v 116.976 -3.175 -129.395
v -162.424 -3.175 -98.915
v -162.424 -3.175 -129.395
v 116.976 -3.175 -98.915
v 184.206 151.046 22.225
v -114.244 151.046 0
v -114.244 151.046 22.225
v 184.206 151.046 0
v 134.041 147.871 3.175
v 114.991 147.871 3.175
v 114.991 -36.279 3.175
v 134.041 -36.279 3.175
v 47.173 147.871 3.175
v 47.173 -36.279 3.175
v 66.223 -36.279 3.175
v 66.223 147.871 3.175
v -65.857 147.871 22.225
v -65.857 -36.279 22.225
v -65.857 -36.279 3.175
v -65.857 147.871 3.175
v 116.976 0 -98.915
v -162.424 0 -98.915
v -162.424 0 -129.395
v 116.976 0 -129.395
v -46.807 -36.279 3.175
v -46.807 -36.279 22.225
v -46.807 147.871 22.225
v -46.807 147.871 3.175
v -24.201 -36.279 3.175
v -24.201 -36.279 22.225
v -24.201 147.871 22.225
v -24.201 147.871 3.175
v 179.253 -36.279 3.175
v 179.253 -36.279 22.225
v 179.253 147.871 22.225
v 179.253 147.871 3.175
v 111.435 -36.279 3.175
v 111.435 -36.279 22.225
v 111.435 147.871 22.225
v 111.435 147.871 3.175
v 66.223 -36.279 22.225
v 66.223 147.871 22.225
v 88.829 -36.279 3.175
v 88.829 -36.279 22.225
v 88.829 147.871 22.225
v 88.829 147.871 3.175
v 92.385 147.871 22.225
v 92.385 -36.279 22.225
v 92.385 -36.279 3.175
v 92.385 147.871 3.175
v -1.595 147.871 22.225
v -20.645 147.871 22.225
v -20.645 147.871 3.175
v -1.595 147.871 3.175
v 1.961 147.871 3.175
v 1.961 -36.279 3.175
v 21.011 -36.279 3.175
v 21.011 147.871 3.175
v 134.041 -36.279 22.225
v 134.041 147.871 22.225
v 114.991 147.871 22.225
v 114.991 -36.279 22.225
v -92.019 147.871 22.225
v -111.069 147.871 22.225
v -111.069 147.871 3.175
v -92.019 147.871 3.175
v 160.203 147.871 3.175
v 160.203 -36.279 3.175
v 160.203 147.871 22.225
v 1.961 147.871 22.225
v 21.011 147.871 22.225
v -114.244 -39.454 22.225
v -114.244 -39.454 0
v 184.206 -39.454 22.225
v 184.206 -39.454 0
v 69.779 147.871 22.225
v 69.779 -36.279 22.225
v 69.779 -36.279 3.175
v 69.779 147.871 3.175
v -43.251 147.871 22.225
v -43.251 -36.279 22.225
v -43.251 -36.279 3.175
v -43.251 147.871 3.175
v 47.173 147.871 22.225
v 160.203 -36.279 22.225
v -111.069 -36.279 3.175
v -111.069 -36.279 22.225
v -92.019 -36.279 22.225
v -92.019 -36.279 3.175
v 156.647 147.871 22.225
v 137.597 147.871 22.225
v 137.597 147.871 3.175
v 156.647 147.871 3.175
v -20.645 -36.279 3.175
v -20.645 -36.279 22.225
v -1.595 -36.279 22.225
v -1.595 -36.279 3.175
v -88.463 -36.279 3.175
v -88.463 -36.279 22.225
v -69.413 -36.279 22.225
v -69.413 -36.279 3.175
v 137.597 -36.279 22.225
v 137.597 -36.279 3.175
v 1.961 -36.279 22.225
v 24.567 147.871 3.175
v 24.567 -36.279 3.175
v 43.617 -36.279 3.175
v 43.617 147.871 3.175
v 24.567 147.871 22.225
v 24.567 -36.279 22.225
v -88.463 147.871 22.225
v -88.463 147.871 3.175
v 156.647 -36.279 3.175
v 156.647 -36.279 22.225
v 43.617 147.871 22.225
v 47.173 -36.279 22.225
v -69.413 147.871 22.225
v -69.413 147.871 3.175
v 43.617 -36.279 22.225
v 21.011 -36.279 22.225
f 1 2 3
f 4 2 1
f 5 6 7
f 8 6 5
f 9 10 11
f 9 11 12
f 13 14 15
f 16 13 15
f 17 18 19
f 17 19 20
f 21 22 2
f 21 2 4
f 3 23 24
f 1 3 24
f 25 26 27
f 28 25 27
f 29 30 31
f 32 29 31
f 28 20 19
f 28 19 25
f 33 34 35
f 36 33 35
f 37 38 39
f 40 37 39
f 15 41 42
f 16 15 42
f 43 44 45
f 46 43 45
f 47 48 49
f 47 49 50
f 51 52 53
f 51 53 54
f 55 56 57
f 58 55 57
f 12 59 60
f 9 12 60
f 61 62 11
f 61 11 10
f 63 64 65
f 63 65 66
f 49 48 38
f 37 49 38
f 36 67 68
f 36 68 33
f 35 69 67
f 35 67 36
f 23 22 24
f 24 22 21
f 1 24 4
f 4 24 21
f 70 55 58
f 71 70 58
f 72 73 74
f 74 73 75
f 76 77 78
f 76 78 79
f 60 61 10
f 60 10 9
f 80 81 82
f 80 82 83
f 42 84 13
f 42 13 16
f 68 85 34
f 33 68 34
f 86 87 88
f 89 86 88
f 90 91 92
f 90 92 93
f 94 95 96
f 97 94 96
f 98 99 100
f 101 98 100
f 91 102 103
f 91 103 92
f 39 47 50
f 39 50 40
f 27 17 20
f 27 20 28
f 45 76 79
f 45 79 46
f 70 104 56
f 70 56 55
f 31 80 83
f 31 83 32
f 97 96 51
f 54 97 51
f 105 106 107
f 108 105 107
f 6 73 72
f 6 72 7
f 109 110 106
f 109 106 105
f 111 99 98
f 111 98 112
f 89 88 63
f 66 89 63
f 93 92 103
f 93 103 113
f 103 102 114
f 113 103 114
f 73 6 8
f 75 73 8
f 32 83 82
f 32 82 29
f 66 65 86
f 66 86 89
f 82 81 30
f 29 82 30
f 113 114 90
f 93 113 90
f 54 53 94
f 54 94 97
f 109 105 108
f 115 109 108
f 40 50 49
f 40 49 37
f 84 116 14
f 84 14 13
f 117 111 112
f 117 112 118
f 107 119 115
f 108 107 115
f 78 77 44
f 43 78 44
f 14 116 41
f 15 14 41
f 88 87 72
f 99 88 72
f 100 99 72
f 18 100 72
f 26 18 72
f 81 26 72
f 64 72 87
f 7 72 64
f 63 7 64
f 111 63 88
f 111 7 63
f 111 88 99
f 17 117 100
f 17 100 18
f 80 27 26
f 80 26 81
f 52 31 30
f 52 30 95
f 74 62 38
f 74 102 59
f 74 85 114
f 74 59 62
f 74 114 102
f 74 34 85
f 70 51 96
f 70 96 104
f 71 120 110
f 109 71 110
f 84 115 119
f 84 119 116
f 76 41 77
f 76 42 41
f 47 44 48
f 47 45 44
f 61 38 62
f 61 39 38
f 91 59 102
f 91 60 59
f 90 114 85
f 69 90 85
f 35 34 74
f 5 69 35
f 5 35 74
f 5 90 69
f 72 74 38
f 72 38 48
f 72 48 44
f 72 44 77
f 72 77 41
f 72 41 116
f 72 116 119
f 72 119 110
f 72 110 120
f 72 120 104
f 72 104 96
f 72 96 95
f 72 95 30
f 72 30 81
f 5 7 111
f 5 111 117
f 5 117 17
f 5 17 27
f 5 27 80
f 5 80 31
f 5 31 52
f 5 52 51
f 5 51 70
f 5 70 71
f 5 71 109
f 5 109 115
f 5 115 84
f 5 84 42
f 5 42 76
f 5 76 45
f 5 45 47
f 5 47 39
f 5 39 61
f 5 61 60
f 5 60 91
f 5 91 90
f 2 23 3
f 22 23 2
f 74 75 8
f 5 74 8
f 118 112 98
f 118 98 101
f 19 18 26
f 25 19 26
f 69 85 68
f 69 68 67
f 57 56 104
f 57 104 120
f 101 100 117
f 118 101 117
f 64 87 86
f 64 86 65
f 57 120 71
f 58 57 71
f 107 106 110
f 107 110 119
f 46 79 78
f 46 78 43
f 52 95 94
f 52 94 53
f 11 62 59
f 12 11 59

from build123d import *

# Parameters (mm, degrees)
F0_W     = 298.45
F0_H     = 190.5
F1_DEPTH = 22.225
F2_W     = 279.4
F2_H     = 30.48
F3_DEPTH = 3.175
F4_W     = 19.05
F4_H     = 184.15
F5_DEPTH = 19.05


with BuildPart() as f1:
    # F0 (on Top) → F1 (new body)
    with BuildSketch(Plane.XY):
        with Locations((34.980681, 55.79597)):
            Rectangle(F0_W, F0_H)
    extrude(amount=F1_DEPTH)

    # F4 (on face) → F5 (cut)
    with BuildSketch(Plane.XY.offset(22.225)):
        with Locations((-101.544319, 55.79597)):
            Rectangle(F4_W, F4_H)
        with Locations((-78.938319, 55.79597)):
            Rectangle(F4_W, F4_H)
        with Locations((-56.332319, 55.79597)):
            Rectangle(F4_W, F4_H)
        with Locations((-33.726319, 55.79597)):
            Rectangle(F4_W, F4_H)
        with Locations((-11.120319, 55.79597)):
            Rectangle(F4_W, F4_H)
        with Locations((11.485681, 55.79597)):
            Rectangle(F4_W, F4_H)
        with Locations((34.091681, 55.79597)):
            Rectangle(F4_W, F4_H)
        with Locations((56.697681, 55.79597)):
            Rectangle(F4_W, F4_H)
        with Locations((79.303681, 55.79597)):
            Rectangle(F4_W, F4_H)
        with Locations((101.909681, 55.79597)):
            Rectangle(F4_W, F4_H)
        with Locations((124.515681, 55.79597)):
            Rectangle(F4_W, F4_H)
        with Locations((147.121681, 55.79597)):
            Rectangle(F4_W, F4_H)
        with Locations((169.727681, 55.79597)):
            Rectangle(F4_W, F4_H)
    extrude(amount=-F5_DEPTH, mode=Mode.SUBTRACT)


with BuildPart() as f3:
    # F2 (on Front) → F3 (new body)
    with BuildSketch(Plane.XZ):
        with Locations((-22.723939, -114.154501)):
            Rectangle(F2_W, F2_H)
    extrude(amount=F3_DEPTH)


solid = Compound([f1.part, f3.part])
